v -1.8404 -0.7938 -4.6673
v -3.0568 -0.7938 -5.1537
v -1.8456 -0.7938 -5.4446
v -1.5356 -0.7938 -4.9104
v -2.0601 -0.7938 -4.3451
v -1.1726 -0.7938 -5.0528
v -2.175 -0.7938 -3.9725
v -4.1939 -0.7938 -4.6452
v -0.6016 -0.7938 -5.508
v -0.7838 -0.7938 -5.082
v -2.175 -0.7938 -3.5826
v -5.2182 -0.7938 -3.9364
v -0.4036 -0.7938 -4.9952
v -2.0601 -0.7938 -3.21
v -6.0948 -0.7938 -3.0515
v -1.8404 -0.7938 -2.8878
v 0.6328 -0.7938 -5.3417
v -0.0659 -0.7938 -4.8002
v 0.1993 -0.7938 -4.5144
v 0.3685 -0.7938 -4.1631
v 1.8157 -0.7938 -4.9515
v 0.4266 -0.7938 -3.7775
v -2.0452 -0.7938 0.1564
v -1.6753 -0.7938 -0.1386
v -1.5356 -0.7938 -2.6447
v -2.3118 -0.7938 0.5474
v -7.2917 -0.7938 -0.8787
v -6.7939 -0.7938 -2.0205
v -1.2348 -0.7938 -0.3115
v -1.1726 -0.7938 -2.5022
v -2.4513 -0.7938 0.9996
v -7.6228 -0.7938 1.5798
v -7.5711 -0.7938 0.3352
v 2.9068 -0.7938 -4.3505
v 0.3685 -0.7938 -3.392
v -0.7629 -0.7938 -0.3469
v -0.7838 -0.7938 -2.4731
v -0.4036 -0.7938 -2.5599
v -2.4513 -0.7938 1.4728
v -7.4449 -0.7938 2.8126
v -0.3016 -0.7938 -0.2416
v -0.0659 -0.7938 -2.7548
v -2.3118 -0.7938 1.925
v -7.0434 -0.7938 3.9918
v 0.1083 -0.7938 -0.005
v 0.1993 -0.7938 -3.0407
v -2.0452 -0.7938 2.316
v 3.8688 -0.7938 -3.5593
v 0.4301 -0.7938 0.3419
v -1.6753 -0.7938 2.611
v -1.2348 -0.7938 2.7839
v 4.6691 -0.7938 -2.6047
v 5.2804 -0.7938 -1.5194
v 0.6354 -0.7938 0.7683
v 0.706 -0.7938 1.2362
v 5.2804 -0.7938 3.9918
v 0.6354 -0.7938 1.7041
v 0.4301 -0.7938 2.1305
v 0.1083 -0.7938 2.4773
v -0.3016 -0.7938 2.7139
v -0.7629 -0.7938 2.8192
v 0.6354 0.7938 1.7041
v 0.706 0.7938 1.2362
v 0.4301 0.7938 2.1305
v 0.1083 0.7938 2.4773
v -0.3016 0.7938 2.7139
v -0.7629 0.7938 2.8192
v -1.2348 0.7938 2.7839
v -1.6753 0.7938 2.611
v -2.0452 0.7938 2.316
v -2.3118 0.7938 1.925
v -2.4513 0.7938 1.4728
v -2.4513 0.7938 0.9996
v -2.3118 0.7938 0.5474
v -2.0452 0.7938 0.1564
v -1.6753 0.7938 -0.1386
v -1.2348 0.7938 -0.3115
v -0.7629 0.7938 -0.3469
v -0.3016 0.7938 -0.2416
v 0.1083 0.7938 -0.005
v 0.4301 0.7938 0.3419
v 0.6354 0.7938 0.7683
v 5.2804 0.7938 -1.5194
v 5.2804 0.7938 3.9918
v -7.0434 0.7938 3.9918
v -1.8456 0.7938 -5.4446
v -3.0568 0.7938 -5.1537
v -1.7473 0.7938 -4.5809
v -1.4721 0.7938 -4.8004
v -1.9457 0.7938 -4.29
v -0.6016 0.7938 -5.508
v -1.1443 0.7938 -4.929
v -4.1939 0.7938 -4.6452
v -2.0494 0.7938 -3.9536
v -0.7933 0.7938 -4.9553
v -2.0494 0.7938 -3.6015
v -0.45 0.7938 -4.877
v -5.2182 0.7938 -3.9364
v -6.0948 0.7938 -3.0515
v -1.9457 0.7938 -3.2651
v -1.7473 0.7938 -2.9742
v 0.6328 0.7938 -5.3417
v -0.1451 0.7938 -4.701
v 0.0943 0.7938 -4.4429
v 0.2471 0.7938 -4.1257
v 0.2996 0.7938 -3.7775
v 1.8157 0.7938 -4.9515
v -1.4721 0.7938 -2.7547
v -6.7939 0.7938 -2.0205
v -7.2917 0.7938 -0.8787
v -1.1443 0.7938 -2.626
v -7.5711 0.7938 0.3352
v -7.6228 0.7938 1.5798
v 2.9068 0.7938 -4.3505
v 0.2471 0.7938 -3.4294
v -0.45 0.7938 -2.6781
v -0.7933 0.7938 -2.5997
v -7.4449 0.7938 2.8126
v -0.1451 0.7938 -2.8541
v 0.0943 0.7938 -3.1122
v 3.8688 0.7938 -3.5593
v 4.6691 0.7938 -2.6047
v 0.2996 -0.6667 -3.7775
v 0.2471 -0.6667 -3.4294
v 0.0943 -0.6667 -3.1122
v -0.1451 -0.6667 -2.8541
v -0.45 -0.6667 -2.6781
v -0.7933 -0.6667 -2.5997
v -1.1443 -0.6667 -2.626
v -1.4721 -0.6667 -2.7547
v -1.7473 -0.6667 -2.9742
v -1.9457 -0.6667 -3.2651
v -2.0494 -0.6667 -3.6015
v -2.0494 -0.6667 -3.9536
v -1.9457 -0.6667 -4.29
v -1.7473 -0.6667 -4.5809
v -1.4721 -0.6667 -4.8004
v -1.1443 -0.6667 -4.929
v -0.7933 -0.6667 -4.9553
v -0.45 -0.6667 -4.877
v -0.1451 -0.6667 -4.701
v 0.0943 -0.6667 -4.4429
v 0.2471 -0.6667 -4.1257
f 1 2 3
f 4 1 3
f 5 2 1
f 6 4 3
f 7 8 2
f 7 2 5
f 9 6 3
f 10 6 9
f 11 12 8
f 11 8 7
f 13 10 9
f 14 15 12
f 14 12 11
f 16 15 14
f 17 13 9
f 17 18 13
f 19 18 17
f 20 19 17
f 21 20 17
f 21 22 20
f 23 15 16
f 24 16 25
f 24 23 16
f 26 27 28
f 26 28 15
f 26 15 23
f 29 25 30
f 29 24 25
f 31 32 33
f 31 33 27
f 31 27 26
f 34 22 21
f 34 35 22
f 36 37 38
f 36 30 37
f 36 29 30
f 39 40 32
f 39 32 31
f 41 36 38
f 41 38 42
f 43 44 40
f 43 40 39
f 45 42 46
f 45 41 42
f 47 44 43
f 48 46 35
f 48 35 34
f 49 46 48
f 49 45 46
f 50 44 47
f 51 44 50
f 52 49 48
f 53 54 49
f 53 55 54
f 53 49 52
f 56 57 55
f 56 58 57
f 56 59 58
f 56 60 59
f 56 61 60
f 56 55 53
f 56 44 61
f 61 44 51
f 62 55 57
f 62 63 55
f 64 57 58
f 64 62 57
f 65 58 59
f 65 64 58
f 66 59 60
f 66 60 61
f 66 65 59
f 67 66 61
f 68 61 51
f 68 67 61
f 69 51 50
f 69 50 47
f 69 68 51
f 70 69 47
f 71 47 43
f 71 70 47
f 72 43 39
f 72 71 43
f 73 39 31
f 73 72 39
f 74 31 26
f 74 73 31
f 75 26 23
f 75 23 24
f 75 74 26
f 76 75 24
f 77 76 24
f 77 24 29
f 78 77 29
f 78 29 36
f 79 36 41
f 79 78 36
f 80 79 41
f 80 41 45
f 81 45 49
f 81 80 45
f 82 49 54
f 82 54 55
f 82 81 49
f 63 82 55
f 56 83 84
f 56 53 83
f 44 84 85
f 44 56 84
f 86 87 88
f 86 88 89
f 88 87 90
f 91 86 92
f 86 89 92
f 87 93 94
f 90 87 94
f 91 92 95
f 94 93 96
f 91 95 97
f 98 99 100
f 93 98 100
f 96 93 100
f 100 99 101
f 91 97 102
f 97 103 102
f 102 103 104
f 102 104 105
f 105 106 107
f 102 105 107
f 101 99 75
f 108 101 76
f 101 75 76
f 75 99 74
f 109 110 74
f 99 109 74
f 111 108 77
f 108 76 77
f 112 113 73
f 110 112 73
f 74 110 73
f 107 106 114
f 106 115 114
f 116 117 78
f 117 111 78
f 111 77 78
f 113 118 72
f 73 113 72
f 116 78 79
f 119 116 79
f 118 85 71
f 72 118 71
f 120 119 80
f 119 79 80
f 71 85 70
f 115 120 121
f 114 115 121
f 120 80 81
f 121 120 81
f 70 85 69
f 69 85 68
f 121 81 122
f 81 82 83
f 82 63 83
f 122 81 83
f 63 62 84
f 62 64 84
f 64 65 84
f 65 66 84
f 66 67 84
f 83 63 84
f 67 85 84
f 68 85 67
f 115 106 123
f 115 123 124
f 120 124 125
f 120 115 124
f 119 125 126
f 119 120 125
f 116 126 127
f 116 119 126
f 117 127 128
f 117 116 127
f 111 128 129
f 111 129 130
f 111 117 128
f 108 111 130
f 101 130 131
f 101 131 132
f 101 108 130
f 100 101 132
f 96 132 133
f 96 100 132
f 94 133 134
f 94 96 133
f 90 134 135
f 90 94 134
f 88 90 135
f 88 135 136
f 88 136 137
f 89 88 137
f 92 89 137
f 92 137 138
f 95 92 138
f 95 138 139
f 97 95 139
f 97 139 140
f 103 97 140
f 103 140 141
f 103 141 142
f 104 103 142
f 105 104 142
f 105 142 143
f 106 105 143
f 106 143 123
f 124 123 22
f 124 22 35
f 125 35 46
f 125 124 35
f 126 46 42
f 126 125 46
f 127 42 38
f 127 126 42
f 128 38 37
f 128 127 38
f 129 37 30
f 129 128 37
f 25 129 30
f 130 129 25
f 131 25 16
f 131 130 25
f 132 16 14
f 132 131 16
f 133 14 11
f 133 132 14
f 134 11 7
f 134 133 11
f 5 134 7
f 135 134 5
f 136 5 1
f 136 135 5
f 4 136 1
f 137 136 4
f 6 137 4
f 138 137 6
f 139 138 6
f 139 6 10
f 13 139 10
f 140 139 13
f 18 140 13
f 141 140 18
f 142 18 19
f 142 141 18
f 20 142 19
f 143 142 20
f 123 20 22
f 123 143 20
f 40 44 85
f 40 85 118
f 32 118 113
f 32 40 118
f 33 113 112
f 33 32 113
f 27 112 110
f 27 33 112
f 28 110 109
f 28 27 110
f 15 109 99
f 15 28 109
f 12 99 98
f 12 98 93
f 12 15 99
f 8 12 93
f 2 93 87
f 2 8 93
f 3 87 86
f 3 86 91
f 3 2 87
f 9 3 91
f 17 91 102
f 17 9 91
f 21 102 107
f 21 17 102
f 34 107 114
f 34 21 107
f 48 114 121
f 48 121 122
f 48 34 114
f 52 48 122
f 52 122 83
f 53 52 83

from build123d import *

# Parameters (mm, degrees)
F0_R     = 1.1811
F0_R_2   = 1.5875
F1_DEPTH = 0.79375
F2_SIZE2 = 0.127
F2_SIZE  = 0.127


with BuildPart() as f1:
    # F0 (on Front) → F1 (new body, symmetric)
    with BuildSketch(Plane.XZ):
        with BuildLine():
            Line((5.280381, 3.991776), (-7.04344, 3.991776))
            ThreePointArc((-7.04344, 3.991776), (-3.637121, -4.925726), (5.280381, -1.519407))
            Line((5.280381, -1.519407), (5.280381, 3.991776))
        make_face()
        with Locations((-0.881529, -3.777536)):
            Circle(F0_R, mode=Mode.SUBTRACT)
        with Locations((-0.881529, 1.236185)):
            Circle(F0_R_2, mode=Mode.SUBTRACT)
    extrude(amount=F1_DEPTH, both=True)

    # F2
    f2_edges = [f1.edges().sort_by_distance(p)[0] for p in [
        (-2.062629, -0.79375, -3.777536),
    ]]
    chamfer(f2_edges, length=F2_SIZE, length2=F2_SIZE2)


solid = f1.part
